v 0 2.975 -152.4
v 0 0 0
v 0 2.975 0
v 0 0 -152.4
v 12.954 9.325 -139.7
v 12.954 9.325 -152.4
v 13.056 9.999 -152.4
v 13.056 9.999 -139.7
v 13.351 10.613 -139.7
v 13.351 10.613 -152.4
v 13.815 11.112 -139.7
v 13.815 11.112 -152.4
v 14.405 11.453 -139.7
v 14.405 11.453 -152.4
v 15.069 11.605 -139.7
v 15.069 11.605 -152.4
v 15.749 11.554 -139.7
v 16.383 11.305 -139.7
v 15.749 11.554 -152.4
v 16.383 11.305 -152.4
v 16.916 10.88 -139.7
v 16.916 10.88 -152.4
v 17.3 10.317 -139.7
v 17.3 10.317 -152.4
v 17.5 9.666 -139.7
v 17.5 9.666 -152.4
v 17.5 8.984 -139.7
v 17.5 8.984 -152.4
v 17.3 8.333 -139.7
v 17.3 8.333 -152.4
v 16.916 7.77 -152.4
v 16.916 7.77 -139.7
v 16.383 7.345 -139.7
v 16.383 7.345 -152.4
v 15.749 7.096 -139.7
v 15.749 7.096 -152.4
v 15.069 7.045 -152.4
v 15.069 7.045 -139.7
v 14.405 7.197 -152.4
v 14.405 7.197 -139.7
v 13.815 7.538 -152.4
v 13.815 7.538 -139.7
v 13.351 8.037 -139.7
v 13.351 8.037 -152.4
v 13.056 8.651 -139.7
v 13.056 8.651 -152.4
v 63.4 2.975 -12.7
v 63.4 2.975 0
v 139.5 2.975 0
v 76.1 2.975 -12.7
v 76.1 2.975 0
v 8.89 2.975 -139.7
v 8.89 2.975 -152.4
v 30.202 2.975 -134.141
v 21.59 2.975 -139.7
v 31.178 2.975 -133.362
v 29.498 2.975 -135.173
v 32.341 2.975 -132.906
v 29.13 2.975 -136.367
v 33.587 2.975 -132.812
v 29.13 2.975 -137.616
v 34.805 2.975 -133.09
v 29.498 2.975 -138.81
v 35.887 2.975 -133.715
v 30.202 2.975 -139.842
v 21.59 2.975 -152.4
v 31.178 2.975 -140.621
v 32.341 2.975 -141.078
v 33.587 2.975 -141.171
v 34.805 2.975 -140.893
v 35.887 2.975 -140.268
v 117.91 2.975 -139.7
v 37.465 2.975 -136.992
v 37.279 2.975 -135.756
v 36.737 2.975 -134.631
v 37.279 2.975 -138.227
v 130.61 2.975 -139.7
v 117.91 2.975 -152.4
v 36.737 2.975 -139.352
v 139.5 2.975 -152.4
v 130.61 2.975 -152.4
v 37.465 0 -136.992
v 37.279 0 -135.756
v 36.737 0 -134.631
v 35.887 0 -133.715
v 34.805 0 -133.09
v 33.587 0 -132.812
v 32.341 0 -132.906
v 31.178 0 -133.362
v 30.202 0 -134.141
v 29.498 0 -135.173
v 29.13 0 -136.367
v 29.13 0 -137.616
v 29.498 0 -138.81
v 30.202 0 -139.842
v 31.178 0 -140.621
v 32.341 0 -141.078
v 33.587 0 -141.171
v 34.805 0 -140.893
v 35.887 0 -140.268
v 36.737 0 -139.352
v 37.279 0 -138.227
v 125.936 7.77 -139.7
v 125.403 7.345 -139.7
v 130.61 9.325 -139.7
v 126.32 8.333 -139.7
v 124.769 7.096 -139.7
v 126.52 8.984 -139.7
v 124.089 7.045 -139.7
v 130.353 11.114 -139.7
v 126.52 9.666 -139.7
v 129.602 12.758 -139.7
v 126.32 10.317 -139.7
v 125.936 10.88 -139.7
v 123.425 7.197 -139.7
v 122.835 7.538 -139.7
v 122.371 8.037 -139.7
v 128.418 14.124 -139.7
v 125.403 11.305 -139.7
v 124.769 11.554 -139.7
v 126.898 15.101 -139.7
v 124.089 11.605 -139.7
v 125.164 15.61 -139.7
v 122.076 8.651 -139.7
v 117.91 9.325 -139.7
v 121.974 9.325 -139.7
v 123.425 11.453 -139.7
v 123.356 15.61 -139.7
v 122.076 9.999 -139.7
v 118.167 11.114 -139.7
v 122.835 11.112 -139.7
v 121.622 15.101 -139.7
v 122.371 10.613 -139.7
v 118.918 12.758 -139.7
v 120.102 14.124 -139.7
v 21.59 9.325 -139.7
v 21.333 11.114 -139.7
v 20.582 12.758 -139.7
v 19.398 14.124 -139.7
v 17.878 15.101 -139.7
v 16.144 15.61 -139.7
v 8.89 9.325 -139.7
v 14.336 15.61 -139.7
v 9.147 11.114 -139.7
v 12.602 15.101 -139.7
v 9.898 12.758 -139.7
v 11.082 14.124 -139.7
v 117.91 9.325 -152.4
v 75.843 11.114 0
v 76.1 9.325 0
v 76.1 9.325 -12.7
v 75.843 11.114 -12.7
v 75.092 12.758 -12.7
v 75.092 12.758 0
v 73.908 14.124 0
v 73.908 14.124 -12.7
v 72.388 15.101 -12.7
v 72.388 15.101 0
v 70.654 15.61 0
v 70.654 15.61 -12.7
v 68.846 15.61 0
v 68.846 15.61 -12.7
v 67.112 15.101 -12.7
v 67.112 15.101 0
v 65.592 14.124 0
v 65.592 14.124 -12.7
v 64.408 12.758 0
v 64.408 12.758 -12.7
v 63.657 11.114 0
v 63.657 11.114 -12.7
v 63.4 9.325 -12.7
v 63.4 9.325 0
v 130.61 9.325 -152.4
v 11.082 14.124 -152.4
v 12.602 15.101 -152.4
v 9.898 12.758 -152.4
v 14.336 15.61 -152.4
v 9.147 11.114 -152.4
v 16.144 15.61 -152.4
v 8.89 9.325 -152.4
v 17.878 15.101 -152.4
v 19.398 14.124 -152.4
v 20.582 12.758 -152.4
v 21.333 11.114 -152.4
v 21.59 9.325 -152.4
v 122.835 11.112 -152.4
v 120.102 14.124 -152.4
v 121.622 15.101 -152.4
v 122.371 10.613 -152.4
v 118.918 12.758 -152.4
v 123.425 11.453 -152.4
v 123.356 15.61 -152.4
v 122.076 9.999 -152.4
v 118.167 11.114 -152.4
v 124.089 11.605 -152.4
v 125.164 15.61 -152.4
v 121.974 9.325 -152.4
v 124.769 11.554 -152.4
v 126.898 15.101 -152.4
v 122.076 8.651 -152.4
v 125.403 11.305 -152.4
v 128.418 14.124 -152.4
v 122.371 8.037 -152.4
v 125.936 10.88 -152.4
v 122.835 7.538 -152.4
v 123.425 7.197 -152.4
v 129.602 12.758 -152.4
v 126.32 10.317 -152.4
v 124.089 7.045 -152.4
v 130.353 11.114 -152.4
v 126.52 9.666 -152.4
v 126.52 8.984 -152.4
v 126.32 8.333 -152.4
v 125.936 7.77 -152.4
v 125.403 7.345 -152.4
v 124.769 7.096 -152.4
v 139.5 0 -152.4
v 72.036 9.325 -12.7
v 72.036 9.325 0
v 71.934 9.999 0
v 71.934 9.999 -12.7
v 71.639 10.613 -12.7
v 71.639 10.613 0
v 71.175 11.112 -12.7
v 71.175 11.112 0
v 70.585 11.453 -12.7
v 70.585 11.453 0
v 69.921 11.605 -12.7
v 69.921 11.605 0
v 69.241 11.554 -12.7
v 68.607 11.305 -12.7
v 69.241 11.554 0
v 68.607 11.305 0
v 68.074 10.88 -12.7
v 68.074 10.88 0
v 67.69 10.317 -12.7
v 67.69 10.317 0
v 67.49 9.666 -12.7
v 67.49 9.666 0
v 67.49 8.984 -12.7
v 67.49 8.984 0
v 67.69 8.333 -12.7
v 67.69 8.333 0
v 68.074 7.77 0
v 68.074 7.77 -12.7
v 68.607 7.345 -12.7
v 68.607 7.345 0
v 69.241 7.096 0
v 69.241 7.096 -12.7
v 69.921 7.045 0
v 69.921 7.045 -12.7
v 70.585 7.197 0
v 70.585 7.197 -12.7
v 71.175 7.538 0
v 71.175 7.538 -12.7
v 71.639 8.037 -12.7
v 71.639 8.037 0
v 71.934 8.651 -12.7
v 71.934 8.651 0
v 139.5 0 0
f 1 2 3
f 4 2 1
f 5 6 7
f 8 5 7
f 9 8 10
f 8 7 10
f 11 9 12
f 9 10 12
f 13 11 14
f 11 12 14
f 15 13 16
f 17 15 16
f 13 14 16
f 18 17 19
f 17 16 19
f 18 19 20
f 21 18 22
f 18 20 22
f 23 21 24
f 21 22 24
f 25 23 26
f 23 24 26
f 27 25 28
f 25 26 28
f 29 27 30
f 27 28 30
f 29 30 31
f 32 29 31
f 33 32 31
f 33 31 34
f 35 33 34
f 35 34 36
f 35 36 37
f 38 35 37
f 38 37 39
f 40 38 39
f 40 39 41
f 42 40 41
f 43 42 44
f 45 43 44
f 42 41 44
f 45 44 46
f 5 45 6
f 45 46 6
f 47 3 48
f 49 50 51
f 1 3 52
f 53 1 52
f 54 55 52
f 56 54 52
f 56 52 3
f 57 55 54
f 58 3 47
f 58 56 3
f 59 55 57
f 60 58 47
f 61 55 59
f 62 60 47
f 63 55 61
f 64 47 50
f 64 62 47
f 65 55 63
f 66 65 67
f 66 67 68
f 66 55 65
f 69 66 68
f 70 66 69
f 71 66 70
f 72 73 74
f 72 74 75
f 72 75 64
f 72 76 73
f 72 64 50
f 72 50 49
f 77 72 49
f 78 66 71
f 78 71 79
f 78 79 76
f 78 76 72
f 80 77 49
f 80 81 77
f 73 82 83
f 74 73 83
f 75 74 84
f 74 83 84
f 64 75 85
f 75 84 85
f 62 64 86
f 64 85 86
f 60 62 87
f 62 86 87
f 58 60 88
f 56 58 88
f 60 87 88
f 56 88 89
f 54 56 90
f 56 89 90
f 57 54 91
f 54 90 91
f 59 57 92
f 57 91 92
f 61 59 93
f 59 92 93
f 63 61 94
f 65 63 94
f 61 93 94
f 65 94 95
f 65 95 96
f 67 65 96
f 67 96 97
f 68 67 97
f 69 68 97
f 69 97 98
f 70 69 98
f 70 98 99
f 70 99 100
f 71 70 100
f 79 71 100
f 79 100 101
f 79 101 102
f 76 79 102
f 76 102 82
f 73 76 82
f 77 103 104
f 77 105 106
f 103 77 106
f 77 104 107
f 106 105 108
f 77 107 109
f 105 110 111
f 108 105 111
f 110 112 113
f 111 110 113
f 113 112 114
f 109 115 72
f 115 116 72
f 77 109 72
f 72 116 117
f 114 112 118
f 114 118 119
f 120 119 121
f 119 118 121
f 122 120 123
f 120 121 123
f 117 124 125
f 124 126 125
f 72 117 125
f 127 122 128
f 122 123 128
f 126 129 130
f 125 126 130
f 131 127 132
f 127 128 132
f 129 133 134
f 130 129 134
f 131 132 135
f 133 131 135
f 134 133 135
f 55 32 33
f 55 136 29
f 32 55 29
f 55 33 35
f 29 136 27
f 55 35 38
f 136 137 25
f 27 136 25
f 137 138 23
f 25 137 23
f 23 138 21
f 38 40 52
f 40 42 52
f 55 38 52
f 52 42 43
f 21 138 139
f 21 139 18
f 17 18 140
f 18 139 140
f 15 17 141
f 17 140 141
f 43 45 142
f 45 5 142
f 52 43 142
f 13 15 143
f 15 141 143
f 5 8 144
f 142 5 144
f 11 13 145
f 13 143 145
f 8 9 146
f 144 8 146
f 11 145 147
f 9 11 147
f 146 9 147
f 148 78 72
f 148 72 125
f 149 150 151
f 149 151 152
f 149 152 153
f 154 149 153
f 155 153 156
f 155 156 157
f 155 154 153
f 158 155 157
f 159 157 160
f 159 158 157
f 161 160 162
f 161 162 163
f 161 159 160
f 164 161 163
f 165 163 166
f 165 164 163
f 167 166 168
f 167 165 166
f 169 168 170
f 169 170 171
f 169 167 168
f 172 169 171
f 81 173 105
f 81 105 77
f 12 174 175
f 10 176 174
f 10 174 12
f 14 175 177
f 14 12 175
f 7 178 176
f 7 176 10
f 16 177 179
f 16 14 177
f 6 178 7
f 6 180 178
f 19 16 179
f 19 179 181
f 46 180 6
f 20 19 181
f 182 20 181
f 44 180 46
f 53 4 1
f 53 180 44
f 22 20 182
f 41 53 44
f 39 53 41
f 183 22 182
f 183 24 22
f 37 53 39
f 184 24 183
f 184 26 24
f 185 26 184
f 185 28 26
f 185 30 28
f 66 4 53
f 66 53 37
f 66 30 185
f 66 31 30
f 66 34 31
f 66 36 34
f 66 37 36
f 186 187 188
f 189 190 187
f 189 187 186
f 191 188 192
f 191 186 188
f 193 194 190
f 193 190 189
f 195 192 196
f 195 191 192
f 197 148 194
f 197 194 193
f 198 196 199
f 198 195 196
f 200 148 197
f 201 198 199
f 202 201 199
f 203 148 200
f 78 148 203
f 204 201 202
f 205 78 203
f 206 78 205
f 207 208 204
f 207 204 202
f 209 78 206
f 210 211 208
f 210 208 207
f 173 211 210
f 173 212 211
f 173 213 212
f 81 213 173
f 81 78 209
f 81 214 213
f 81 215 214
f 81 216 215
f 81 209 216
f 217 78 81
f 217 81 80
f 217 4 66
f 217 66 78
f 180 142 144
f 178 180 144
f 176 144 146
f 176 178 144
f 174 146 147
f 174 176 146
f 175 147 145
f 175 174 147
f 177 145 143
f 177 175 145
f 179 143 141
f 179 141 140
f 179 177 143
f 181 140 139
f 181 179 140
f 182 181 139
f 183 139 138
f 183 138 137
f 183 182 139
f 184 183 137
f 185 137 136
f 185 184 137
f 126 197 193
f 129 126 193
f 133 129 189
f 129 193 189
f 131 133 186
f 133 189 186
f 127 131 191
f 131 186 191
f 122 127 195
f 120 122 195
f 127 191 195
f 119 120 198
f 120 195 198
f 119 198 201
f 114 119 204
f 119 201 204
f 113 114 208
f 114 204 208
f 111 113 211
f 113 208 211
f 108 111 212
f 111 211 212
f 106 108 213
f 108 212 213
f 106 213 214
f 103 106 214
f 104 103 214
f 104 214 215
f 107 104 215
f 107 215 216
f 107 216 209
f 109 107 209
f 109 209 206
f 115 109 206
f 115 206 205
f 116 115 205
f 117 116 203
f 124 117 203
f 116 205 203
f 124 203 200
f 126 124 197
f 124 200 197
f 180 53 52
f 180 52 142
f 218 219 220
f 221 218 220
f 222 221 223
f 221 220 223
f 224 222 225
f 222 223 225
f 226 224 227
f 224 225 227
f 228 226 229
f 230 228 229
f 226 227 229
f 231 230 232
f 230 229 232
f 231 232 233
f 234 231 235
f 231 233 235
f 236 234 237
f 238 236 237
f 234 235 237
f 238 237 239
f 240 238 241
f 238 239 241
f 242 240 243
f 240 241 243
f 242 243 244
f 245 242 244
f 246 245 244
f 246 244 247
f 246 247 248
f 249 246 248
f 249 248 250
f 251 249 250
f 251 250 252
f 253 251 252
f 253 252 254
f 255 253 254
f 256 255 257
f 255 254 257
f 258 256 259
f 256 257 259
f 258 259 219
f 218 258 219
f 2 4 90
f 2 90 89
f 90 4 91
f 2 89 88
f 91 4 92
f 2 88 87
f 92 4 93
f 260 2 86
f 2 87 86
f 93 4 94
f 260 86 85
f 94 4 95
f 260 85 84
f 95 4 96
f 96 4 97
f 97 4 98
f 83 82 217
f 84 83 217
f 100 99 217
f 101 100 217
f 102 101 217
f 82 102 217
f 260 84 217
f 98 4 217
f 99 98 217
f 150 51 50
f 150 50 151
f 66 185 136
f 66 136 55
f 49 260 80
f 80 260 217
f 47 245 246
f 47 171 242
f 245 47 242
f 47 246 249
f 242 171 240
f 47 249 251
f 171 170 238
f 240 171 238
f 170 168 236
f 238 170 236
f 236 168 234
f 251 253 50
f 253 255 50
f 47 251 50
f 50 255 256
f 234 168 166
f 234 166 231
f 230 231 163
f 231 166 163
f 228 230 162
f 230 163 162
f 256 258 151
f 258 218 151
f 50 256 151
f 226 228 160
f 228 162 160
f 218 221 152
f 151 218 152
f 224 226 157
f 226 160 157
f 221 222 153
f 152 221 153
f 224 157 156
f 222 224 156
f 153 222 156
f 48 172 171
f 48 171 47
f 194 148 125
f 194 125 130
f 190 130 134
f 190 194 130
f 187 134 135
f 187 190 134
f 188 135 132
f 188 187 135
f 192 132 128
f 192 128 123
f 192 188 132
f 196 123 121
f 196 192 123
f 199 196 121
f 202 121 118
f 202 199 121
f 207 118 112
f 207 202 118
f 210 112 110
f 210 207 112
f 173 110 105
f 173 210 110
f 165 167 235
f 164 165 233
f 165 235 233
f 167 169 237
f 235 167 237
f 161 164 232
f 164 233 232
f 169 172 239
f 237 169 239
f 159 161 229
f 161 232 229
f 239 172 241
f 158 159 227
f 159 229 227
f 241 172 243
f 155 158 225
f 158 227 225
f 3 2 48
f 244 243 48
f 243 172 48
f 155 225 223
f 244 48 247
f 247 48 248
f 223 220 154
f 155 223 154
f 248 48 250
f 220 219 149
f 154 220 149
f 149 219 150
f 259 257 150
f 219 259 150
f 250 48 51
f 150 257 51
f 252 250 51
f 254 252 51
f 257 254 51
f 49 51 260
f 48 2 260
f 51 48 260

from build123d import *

# Parameters (mm, degrees)
SKETCH1_W           = 139.5
SKETCH1_H           = 152.4
BOSS_EXTRUDE1_DEPTH = 6.35
SKETCH2_W           = 139.5
SKETCH2_H           = 152.4
CUT_EXTRUDE1_DEPTH  = 3.375
SKETCH3_R           = 2.286
BOSS_EXTRUDE2_DEPTH = 12.7
SKETCH4_R           = 2.286
BOSS_EXTRUDE3_DEPTH = 12.7
SKETCH5_R           = 4.191
CUT_EXTRUDE2_DEPTH  = 16.675000158


with BuildPart() as part:
    # Sketch1 → Boss-Extrude1 (new body)
    with BuildSketch(Plane(origin=(0, 0, 0), x_dir=(1, 0, 0), z_dir=(0, 1, 0))):
        with Locations((69.75, 76.2)):
            Rectangle(SKETCH1_W, SKETCH1_H)
    extrude(amount=BOSS_EXTRUDE1_DEPTH)

    # Sketch2 → Cut-Extrude1 (cut)
    with BuildSketch(Plane(origin=(0, 6.35, 0), x_dir=(1, 0, 0), z_dir=(0, 1, 0))):
        with Locations((69.75, 76.2)):
            Rectangle(SKETCH2_W, SKETCH2_H)
    extrude(amount=-CUT_EXTRUDE1_DEPTH, mode=Mode.SUBTRACT)

    # Sketch3 → Boss-Extrude2 (add)
    with BuildSketch(Plane.XY):
        with BuildLine():
            Line((63.4, 9.325), (63.4, 2.975))
            Line((63.4, 2.975), (76.1, 2.975))
            Line((76.1, 2.975), (76.1, 9.325000158))
            ThreePointArc((76.1, 9.325000158), (69.749999921, 15.675000158), (63.4, 9.325))
        make_face()
        with Locations((69.75, 9.325000158)):
            Circle(SKETCH3_R, mode=Mode.SUBTRACT)
    extrude(amount=-BOSS_EXTRUDE2_DEPTH)

    # Sketch4 → Boss-Extrude3 (add)
    with BuildSketch(Plane(origin=(0, 0, -152.4), x_dir=(-1, 0, 0), z_dir=(0, 0, -1))):
        with BuildLine():
            Line((-130.61, 9.325), (-130.61, 2.975))
            Line((-130.61, 2.975), (-117.91, 2.975))
            Line((-117.91, 2.975), (-117.91, 9.325))
            ThreePointArc((-117.91, 9.325), (-124.26, 15.675), (-130.61, 9.325))
        make_face()
        with Locations((-124.26, 9.325)):
            Circle(SKETCH4_R, mode=Mode.SUBTRACT)
        with BuildLine():
            Line((-21.59, 9.325), (-21.59, 2.975))
            Line((-21.59, 2.975), (-8.89, 2.975))
            Line((-8.89, 2.975), (-8.89, 9.325))
            ThreePointArc((-8.89, 9.325), (-15.24, 15.675), (-21.59, 9.325))
        make_face()
        with Locations((-15.24, 9.325)):
            Circle(SKETCH4_R, mode=Mode.SUBTRACT)
    extrude(amount=-BOSS_EXTRUDE3_DEPTH)

    # Sketch5 → Cut-Extrude2 (cut, through all)
    with BuildSketch(Plane.XZ):
        with Locations((33.274, -136.991598)):
            Circle(SKETCH5_R)
    extrude(amount=-CUT_EXTRUDE2_DEPTH, mode=Mode.SUBTRACT)


solid = part.part
